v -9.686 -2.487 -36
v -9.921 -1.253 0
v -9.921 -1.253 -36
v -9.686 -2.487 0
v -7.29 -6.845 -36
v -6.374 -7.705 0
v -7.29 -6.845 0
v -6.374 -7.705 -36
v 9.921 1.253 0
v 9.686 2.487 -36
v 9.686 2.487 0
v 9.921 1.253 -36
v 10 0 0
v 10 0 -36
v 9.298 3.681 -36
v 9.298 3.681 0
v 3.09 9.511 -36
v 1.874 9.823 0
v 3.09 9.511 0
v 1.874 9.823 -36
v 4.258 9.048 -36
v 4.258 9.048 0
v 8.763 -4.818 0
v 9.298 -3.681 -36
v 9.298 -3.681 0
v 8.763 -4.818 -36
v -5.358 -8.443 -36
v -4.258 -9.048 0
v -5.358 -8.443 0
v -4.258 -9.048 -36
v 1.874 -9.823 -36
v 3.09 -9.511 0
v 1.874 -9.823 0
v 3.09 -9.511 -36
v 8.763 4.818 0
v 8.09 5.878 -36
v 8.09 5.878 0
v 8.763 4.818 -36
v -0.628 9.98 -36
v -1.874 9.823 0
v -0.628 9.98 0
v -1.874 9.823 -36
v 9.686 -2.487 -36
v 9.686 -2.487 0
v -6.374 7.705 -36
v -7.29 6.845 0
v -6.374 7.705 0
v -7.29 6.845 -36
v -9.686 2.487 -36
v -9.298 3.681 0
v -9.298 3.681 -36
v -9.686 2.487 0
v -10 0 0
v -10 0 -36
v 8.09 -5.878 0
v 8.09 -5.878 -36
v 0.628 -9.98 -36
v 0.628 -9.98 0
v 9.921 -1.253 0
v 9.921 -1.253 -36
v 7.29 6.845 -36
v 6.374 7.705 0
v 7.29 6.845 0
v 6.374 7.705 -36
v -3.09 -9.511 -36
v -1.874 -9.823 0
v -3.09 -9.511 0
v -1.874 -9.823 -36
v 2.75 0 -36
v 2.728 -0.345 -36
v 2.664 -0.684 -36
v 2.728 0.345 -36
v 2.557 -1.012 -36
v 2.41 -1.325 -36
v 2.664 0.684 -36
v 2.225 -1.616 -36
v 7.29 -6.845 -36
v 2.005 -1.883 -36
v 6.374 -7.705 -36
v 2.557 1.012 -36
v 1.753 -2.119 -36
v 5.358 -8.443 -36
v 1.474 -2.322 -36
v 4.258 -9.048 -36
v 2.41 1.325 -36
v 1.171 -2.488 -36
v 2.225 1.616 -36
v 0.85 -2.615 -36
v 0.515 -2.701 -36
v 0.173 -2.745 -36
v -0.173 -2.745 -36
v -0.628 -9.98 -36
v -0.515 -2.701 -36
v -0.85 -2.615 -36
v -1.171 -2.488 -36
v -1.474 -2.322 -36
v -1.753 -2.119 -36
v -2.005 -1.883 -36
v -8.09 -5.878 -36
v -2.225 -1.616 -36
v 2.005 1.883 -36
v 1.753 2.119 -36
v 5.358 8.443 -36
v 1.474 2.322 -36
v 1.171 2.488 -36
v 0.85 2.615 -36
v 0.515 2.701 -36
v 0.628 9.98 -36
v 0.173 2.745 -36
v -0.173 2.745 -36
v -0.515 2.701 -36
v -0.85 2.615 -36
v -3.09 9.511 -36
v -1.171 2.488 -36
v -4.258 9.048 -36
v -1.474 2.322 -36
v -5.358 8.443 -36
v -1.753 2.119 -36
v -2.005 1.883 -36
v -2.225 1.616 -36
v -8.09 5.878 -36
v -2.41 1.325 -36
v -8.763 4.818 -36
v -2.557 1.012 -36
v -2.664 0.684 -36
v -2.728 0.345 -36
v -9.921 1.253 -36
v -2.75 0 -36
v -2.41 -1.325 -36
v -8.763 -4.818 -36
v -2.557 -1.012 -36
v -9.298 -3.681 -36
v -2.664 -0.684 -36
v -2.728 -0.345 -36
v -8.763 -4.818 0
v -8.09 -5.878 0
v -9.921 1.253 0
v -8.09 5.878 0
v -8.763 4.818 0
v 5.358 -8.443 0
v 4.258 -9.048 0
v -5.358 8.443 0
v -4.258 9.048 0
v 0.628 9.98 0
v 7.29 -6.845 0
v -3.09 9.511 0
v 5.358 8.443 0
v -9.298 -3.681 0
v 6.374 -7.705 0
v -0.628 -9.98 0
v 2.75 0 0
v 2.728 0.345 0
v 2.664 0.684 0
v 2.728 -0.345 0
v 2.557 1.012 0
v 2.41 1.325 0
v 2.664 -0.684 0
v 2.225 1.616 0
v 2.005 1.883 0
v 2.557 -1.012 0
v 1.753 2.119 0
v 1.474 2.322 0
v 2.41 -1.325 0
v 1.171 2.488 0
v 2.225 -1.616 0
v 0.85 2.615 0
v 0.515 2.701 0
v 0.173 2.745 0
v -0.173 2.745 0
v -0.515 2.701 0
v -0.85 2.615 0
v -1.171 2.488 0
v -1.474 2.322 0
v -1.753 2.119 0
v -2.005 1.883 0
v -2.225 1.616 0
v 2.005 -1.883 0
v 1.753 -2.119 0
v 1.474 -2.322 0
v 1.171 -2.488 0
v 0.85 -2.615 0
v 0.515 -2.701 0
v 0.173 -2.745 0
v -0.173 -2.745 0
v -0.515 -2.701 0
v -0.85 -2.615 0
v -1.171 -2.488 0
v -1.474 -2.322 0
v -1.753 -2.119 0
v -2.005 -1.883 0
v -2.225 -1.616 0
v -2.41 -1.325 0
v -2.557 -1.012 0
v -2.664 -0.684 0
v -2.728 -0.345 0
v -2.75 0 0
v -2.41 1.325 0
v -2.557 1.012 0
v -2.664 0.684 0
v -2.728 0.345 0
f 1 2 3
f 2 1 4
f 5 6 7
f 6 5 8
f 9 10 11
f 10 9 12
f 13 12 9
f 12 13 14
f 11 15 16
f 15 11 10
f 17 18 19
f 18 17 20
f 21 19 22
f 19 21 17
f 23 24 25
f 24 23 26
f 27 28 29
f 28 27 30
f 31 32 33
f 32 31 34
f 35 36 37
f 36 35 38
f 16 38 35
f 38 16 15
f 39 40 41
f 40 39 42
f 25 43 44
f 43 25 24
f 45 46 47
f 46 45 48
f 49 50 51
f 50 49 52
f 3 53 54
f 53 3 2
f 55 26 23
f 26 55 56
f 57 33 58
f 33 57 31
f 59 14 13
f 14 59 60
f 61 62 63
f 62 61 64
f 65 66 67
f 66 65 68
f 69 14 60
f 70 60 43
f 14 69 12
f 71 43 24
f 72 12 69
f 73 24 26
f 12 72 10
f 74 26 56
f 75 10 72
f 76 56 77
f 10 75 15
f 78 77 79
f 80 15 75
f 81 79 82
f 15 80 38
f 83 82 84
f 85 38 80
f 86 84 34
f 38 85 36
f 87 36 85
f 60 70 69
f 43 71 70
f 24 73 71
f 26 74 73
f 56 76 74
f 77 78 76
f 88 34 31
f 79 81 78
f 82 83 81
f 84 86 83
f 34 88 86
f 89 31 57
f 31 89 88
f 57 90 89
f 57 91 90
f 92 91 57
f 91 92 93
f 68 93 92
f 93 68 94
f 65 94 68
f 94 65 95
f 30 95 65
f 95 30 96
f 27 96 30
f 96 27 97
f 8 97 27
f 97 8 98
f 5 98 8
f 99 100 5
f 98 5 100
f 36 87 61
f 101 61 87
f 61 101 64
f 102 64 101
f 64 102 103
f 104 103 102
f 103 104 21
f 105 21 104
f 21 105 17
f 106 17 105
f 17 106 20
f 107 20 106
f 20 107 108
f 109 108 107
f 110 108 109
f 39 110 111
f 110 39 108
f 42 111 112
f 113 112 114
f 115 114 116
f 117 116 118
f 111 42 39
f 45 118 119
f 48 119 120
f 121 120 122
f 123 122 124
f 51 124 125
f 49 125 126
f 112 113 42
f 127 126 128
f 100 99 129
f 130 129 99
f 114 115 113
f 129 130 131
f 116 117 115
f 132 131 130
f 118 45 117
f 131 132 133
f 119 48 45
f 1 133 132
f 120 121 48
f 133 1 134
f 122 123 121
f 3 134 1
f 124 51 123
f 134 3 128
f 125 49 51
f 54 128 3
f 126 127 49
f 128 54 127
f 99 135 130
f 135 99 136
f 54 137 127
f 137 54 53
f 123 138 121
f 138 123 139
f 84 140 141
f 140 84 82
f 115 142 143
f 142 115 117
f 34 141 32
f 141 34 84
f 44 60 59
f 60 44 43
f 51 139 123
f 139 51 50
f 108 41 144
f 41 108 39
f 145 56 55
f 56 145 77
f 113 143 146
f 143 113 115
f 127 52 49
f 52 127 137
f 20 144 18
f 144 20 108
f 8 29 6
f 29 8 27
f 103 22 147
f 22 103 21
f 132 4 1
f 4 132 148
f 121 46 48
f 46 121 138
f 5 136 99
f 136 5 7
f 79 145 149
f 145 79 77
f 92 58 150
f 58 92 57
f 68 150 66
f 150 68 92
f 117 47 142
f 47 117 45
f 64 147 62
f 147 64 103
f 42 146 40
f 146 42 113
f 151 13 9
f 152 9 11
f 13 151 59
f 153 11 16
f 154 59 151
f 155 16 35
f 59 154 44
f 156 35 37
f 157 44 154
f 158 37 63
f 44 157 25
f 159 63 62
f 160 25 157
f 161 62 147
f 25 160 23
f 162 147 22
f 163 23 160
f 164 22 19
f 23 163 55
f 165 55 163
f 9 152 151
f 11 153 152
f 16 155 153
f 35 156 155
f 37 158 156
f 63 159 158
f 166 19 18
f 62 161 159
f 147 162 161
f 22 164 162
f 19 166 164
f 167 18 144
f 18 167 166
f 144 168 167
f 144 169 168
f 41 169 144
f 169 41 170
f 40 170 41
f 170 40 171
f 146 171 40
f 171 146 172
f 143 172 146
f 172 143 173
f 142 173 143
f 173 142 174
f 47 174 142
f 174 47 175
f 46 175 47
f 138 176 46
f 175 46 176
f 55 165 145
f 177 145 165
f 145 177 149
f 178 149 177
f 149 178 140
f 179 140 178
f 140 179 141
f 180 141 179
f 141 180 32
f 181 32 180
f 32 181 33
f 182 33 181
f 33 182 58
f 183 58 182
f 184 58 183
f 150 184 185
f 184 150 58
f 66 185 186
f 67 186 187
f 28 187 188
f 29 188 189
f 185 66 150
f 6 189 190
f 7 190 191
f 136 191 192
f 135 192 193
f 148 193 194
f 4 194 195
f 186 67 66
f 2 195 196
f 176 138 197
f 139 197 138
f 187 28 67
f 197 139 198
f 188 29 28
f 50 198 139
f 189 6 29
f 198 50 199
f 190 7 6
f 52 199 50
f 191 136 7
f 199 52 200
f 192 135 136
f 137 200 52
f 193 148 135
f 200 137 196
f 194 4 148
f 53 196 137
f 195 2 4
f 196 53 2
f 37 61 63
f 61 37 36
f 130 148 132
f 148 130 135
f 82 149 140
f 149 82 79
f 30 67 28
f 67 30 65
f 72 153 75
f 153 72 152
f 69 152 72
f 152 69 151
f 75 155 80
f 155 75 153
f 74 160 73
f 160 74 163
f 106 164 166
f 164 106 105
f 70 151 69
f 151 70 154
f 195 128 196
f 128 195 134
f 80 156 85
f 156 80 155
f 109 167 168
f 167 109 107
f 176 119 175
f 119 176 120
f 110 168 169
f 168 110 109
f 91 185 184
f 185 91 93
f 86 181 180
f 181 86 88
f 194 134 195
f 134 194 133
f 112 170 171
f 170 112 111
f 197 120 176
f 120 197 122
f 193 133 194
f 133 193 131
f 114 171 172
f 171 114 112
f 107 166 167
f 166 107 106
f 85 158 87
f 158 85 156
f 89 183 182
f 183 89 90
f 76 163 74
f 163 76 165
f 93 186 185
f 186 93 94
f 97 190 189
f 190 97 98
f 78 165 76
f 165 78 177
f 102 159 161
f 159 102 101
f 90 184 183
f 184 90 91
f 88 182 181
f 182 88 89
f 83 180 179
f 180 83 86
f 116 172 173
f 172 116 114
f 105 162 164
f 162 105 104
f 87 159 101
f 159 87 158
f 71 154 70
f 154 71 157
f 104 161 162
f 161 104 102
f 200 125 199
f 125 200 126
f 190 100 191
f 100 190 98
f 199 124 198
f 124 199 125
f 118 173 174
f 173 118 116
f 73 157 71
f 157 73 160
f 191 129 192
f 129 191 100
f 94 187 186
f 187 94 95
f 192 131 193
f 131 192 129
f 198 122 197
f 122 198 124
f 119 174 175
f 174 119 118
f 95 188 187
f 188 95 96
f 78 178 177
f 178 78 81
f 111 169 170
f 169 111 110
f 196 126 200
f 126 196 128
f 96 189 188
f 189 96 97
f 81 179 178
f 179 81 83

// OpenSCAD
$fn = 50;


difference() {
	union() {
		translate(v = [0, 0, -36.0000000000]) {
			cylinder(h = 36, r = 10.0000000000);
		}
		cylinder(h = 0, r = 16.0000000000);
	}
	union() {
		#translate(v = [0, 0, -36]) {
			cylinder(h = 36, r = 2.7500000000);
		}
	}
}
